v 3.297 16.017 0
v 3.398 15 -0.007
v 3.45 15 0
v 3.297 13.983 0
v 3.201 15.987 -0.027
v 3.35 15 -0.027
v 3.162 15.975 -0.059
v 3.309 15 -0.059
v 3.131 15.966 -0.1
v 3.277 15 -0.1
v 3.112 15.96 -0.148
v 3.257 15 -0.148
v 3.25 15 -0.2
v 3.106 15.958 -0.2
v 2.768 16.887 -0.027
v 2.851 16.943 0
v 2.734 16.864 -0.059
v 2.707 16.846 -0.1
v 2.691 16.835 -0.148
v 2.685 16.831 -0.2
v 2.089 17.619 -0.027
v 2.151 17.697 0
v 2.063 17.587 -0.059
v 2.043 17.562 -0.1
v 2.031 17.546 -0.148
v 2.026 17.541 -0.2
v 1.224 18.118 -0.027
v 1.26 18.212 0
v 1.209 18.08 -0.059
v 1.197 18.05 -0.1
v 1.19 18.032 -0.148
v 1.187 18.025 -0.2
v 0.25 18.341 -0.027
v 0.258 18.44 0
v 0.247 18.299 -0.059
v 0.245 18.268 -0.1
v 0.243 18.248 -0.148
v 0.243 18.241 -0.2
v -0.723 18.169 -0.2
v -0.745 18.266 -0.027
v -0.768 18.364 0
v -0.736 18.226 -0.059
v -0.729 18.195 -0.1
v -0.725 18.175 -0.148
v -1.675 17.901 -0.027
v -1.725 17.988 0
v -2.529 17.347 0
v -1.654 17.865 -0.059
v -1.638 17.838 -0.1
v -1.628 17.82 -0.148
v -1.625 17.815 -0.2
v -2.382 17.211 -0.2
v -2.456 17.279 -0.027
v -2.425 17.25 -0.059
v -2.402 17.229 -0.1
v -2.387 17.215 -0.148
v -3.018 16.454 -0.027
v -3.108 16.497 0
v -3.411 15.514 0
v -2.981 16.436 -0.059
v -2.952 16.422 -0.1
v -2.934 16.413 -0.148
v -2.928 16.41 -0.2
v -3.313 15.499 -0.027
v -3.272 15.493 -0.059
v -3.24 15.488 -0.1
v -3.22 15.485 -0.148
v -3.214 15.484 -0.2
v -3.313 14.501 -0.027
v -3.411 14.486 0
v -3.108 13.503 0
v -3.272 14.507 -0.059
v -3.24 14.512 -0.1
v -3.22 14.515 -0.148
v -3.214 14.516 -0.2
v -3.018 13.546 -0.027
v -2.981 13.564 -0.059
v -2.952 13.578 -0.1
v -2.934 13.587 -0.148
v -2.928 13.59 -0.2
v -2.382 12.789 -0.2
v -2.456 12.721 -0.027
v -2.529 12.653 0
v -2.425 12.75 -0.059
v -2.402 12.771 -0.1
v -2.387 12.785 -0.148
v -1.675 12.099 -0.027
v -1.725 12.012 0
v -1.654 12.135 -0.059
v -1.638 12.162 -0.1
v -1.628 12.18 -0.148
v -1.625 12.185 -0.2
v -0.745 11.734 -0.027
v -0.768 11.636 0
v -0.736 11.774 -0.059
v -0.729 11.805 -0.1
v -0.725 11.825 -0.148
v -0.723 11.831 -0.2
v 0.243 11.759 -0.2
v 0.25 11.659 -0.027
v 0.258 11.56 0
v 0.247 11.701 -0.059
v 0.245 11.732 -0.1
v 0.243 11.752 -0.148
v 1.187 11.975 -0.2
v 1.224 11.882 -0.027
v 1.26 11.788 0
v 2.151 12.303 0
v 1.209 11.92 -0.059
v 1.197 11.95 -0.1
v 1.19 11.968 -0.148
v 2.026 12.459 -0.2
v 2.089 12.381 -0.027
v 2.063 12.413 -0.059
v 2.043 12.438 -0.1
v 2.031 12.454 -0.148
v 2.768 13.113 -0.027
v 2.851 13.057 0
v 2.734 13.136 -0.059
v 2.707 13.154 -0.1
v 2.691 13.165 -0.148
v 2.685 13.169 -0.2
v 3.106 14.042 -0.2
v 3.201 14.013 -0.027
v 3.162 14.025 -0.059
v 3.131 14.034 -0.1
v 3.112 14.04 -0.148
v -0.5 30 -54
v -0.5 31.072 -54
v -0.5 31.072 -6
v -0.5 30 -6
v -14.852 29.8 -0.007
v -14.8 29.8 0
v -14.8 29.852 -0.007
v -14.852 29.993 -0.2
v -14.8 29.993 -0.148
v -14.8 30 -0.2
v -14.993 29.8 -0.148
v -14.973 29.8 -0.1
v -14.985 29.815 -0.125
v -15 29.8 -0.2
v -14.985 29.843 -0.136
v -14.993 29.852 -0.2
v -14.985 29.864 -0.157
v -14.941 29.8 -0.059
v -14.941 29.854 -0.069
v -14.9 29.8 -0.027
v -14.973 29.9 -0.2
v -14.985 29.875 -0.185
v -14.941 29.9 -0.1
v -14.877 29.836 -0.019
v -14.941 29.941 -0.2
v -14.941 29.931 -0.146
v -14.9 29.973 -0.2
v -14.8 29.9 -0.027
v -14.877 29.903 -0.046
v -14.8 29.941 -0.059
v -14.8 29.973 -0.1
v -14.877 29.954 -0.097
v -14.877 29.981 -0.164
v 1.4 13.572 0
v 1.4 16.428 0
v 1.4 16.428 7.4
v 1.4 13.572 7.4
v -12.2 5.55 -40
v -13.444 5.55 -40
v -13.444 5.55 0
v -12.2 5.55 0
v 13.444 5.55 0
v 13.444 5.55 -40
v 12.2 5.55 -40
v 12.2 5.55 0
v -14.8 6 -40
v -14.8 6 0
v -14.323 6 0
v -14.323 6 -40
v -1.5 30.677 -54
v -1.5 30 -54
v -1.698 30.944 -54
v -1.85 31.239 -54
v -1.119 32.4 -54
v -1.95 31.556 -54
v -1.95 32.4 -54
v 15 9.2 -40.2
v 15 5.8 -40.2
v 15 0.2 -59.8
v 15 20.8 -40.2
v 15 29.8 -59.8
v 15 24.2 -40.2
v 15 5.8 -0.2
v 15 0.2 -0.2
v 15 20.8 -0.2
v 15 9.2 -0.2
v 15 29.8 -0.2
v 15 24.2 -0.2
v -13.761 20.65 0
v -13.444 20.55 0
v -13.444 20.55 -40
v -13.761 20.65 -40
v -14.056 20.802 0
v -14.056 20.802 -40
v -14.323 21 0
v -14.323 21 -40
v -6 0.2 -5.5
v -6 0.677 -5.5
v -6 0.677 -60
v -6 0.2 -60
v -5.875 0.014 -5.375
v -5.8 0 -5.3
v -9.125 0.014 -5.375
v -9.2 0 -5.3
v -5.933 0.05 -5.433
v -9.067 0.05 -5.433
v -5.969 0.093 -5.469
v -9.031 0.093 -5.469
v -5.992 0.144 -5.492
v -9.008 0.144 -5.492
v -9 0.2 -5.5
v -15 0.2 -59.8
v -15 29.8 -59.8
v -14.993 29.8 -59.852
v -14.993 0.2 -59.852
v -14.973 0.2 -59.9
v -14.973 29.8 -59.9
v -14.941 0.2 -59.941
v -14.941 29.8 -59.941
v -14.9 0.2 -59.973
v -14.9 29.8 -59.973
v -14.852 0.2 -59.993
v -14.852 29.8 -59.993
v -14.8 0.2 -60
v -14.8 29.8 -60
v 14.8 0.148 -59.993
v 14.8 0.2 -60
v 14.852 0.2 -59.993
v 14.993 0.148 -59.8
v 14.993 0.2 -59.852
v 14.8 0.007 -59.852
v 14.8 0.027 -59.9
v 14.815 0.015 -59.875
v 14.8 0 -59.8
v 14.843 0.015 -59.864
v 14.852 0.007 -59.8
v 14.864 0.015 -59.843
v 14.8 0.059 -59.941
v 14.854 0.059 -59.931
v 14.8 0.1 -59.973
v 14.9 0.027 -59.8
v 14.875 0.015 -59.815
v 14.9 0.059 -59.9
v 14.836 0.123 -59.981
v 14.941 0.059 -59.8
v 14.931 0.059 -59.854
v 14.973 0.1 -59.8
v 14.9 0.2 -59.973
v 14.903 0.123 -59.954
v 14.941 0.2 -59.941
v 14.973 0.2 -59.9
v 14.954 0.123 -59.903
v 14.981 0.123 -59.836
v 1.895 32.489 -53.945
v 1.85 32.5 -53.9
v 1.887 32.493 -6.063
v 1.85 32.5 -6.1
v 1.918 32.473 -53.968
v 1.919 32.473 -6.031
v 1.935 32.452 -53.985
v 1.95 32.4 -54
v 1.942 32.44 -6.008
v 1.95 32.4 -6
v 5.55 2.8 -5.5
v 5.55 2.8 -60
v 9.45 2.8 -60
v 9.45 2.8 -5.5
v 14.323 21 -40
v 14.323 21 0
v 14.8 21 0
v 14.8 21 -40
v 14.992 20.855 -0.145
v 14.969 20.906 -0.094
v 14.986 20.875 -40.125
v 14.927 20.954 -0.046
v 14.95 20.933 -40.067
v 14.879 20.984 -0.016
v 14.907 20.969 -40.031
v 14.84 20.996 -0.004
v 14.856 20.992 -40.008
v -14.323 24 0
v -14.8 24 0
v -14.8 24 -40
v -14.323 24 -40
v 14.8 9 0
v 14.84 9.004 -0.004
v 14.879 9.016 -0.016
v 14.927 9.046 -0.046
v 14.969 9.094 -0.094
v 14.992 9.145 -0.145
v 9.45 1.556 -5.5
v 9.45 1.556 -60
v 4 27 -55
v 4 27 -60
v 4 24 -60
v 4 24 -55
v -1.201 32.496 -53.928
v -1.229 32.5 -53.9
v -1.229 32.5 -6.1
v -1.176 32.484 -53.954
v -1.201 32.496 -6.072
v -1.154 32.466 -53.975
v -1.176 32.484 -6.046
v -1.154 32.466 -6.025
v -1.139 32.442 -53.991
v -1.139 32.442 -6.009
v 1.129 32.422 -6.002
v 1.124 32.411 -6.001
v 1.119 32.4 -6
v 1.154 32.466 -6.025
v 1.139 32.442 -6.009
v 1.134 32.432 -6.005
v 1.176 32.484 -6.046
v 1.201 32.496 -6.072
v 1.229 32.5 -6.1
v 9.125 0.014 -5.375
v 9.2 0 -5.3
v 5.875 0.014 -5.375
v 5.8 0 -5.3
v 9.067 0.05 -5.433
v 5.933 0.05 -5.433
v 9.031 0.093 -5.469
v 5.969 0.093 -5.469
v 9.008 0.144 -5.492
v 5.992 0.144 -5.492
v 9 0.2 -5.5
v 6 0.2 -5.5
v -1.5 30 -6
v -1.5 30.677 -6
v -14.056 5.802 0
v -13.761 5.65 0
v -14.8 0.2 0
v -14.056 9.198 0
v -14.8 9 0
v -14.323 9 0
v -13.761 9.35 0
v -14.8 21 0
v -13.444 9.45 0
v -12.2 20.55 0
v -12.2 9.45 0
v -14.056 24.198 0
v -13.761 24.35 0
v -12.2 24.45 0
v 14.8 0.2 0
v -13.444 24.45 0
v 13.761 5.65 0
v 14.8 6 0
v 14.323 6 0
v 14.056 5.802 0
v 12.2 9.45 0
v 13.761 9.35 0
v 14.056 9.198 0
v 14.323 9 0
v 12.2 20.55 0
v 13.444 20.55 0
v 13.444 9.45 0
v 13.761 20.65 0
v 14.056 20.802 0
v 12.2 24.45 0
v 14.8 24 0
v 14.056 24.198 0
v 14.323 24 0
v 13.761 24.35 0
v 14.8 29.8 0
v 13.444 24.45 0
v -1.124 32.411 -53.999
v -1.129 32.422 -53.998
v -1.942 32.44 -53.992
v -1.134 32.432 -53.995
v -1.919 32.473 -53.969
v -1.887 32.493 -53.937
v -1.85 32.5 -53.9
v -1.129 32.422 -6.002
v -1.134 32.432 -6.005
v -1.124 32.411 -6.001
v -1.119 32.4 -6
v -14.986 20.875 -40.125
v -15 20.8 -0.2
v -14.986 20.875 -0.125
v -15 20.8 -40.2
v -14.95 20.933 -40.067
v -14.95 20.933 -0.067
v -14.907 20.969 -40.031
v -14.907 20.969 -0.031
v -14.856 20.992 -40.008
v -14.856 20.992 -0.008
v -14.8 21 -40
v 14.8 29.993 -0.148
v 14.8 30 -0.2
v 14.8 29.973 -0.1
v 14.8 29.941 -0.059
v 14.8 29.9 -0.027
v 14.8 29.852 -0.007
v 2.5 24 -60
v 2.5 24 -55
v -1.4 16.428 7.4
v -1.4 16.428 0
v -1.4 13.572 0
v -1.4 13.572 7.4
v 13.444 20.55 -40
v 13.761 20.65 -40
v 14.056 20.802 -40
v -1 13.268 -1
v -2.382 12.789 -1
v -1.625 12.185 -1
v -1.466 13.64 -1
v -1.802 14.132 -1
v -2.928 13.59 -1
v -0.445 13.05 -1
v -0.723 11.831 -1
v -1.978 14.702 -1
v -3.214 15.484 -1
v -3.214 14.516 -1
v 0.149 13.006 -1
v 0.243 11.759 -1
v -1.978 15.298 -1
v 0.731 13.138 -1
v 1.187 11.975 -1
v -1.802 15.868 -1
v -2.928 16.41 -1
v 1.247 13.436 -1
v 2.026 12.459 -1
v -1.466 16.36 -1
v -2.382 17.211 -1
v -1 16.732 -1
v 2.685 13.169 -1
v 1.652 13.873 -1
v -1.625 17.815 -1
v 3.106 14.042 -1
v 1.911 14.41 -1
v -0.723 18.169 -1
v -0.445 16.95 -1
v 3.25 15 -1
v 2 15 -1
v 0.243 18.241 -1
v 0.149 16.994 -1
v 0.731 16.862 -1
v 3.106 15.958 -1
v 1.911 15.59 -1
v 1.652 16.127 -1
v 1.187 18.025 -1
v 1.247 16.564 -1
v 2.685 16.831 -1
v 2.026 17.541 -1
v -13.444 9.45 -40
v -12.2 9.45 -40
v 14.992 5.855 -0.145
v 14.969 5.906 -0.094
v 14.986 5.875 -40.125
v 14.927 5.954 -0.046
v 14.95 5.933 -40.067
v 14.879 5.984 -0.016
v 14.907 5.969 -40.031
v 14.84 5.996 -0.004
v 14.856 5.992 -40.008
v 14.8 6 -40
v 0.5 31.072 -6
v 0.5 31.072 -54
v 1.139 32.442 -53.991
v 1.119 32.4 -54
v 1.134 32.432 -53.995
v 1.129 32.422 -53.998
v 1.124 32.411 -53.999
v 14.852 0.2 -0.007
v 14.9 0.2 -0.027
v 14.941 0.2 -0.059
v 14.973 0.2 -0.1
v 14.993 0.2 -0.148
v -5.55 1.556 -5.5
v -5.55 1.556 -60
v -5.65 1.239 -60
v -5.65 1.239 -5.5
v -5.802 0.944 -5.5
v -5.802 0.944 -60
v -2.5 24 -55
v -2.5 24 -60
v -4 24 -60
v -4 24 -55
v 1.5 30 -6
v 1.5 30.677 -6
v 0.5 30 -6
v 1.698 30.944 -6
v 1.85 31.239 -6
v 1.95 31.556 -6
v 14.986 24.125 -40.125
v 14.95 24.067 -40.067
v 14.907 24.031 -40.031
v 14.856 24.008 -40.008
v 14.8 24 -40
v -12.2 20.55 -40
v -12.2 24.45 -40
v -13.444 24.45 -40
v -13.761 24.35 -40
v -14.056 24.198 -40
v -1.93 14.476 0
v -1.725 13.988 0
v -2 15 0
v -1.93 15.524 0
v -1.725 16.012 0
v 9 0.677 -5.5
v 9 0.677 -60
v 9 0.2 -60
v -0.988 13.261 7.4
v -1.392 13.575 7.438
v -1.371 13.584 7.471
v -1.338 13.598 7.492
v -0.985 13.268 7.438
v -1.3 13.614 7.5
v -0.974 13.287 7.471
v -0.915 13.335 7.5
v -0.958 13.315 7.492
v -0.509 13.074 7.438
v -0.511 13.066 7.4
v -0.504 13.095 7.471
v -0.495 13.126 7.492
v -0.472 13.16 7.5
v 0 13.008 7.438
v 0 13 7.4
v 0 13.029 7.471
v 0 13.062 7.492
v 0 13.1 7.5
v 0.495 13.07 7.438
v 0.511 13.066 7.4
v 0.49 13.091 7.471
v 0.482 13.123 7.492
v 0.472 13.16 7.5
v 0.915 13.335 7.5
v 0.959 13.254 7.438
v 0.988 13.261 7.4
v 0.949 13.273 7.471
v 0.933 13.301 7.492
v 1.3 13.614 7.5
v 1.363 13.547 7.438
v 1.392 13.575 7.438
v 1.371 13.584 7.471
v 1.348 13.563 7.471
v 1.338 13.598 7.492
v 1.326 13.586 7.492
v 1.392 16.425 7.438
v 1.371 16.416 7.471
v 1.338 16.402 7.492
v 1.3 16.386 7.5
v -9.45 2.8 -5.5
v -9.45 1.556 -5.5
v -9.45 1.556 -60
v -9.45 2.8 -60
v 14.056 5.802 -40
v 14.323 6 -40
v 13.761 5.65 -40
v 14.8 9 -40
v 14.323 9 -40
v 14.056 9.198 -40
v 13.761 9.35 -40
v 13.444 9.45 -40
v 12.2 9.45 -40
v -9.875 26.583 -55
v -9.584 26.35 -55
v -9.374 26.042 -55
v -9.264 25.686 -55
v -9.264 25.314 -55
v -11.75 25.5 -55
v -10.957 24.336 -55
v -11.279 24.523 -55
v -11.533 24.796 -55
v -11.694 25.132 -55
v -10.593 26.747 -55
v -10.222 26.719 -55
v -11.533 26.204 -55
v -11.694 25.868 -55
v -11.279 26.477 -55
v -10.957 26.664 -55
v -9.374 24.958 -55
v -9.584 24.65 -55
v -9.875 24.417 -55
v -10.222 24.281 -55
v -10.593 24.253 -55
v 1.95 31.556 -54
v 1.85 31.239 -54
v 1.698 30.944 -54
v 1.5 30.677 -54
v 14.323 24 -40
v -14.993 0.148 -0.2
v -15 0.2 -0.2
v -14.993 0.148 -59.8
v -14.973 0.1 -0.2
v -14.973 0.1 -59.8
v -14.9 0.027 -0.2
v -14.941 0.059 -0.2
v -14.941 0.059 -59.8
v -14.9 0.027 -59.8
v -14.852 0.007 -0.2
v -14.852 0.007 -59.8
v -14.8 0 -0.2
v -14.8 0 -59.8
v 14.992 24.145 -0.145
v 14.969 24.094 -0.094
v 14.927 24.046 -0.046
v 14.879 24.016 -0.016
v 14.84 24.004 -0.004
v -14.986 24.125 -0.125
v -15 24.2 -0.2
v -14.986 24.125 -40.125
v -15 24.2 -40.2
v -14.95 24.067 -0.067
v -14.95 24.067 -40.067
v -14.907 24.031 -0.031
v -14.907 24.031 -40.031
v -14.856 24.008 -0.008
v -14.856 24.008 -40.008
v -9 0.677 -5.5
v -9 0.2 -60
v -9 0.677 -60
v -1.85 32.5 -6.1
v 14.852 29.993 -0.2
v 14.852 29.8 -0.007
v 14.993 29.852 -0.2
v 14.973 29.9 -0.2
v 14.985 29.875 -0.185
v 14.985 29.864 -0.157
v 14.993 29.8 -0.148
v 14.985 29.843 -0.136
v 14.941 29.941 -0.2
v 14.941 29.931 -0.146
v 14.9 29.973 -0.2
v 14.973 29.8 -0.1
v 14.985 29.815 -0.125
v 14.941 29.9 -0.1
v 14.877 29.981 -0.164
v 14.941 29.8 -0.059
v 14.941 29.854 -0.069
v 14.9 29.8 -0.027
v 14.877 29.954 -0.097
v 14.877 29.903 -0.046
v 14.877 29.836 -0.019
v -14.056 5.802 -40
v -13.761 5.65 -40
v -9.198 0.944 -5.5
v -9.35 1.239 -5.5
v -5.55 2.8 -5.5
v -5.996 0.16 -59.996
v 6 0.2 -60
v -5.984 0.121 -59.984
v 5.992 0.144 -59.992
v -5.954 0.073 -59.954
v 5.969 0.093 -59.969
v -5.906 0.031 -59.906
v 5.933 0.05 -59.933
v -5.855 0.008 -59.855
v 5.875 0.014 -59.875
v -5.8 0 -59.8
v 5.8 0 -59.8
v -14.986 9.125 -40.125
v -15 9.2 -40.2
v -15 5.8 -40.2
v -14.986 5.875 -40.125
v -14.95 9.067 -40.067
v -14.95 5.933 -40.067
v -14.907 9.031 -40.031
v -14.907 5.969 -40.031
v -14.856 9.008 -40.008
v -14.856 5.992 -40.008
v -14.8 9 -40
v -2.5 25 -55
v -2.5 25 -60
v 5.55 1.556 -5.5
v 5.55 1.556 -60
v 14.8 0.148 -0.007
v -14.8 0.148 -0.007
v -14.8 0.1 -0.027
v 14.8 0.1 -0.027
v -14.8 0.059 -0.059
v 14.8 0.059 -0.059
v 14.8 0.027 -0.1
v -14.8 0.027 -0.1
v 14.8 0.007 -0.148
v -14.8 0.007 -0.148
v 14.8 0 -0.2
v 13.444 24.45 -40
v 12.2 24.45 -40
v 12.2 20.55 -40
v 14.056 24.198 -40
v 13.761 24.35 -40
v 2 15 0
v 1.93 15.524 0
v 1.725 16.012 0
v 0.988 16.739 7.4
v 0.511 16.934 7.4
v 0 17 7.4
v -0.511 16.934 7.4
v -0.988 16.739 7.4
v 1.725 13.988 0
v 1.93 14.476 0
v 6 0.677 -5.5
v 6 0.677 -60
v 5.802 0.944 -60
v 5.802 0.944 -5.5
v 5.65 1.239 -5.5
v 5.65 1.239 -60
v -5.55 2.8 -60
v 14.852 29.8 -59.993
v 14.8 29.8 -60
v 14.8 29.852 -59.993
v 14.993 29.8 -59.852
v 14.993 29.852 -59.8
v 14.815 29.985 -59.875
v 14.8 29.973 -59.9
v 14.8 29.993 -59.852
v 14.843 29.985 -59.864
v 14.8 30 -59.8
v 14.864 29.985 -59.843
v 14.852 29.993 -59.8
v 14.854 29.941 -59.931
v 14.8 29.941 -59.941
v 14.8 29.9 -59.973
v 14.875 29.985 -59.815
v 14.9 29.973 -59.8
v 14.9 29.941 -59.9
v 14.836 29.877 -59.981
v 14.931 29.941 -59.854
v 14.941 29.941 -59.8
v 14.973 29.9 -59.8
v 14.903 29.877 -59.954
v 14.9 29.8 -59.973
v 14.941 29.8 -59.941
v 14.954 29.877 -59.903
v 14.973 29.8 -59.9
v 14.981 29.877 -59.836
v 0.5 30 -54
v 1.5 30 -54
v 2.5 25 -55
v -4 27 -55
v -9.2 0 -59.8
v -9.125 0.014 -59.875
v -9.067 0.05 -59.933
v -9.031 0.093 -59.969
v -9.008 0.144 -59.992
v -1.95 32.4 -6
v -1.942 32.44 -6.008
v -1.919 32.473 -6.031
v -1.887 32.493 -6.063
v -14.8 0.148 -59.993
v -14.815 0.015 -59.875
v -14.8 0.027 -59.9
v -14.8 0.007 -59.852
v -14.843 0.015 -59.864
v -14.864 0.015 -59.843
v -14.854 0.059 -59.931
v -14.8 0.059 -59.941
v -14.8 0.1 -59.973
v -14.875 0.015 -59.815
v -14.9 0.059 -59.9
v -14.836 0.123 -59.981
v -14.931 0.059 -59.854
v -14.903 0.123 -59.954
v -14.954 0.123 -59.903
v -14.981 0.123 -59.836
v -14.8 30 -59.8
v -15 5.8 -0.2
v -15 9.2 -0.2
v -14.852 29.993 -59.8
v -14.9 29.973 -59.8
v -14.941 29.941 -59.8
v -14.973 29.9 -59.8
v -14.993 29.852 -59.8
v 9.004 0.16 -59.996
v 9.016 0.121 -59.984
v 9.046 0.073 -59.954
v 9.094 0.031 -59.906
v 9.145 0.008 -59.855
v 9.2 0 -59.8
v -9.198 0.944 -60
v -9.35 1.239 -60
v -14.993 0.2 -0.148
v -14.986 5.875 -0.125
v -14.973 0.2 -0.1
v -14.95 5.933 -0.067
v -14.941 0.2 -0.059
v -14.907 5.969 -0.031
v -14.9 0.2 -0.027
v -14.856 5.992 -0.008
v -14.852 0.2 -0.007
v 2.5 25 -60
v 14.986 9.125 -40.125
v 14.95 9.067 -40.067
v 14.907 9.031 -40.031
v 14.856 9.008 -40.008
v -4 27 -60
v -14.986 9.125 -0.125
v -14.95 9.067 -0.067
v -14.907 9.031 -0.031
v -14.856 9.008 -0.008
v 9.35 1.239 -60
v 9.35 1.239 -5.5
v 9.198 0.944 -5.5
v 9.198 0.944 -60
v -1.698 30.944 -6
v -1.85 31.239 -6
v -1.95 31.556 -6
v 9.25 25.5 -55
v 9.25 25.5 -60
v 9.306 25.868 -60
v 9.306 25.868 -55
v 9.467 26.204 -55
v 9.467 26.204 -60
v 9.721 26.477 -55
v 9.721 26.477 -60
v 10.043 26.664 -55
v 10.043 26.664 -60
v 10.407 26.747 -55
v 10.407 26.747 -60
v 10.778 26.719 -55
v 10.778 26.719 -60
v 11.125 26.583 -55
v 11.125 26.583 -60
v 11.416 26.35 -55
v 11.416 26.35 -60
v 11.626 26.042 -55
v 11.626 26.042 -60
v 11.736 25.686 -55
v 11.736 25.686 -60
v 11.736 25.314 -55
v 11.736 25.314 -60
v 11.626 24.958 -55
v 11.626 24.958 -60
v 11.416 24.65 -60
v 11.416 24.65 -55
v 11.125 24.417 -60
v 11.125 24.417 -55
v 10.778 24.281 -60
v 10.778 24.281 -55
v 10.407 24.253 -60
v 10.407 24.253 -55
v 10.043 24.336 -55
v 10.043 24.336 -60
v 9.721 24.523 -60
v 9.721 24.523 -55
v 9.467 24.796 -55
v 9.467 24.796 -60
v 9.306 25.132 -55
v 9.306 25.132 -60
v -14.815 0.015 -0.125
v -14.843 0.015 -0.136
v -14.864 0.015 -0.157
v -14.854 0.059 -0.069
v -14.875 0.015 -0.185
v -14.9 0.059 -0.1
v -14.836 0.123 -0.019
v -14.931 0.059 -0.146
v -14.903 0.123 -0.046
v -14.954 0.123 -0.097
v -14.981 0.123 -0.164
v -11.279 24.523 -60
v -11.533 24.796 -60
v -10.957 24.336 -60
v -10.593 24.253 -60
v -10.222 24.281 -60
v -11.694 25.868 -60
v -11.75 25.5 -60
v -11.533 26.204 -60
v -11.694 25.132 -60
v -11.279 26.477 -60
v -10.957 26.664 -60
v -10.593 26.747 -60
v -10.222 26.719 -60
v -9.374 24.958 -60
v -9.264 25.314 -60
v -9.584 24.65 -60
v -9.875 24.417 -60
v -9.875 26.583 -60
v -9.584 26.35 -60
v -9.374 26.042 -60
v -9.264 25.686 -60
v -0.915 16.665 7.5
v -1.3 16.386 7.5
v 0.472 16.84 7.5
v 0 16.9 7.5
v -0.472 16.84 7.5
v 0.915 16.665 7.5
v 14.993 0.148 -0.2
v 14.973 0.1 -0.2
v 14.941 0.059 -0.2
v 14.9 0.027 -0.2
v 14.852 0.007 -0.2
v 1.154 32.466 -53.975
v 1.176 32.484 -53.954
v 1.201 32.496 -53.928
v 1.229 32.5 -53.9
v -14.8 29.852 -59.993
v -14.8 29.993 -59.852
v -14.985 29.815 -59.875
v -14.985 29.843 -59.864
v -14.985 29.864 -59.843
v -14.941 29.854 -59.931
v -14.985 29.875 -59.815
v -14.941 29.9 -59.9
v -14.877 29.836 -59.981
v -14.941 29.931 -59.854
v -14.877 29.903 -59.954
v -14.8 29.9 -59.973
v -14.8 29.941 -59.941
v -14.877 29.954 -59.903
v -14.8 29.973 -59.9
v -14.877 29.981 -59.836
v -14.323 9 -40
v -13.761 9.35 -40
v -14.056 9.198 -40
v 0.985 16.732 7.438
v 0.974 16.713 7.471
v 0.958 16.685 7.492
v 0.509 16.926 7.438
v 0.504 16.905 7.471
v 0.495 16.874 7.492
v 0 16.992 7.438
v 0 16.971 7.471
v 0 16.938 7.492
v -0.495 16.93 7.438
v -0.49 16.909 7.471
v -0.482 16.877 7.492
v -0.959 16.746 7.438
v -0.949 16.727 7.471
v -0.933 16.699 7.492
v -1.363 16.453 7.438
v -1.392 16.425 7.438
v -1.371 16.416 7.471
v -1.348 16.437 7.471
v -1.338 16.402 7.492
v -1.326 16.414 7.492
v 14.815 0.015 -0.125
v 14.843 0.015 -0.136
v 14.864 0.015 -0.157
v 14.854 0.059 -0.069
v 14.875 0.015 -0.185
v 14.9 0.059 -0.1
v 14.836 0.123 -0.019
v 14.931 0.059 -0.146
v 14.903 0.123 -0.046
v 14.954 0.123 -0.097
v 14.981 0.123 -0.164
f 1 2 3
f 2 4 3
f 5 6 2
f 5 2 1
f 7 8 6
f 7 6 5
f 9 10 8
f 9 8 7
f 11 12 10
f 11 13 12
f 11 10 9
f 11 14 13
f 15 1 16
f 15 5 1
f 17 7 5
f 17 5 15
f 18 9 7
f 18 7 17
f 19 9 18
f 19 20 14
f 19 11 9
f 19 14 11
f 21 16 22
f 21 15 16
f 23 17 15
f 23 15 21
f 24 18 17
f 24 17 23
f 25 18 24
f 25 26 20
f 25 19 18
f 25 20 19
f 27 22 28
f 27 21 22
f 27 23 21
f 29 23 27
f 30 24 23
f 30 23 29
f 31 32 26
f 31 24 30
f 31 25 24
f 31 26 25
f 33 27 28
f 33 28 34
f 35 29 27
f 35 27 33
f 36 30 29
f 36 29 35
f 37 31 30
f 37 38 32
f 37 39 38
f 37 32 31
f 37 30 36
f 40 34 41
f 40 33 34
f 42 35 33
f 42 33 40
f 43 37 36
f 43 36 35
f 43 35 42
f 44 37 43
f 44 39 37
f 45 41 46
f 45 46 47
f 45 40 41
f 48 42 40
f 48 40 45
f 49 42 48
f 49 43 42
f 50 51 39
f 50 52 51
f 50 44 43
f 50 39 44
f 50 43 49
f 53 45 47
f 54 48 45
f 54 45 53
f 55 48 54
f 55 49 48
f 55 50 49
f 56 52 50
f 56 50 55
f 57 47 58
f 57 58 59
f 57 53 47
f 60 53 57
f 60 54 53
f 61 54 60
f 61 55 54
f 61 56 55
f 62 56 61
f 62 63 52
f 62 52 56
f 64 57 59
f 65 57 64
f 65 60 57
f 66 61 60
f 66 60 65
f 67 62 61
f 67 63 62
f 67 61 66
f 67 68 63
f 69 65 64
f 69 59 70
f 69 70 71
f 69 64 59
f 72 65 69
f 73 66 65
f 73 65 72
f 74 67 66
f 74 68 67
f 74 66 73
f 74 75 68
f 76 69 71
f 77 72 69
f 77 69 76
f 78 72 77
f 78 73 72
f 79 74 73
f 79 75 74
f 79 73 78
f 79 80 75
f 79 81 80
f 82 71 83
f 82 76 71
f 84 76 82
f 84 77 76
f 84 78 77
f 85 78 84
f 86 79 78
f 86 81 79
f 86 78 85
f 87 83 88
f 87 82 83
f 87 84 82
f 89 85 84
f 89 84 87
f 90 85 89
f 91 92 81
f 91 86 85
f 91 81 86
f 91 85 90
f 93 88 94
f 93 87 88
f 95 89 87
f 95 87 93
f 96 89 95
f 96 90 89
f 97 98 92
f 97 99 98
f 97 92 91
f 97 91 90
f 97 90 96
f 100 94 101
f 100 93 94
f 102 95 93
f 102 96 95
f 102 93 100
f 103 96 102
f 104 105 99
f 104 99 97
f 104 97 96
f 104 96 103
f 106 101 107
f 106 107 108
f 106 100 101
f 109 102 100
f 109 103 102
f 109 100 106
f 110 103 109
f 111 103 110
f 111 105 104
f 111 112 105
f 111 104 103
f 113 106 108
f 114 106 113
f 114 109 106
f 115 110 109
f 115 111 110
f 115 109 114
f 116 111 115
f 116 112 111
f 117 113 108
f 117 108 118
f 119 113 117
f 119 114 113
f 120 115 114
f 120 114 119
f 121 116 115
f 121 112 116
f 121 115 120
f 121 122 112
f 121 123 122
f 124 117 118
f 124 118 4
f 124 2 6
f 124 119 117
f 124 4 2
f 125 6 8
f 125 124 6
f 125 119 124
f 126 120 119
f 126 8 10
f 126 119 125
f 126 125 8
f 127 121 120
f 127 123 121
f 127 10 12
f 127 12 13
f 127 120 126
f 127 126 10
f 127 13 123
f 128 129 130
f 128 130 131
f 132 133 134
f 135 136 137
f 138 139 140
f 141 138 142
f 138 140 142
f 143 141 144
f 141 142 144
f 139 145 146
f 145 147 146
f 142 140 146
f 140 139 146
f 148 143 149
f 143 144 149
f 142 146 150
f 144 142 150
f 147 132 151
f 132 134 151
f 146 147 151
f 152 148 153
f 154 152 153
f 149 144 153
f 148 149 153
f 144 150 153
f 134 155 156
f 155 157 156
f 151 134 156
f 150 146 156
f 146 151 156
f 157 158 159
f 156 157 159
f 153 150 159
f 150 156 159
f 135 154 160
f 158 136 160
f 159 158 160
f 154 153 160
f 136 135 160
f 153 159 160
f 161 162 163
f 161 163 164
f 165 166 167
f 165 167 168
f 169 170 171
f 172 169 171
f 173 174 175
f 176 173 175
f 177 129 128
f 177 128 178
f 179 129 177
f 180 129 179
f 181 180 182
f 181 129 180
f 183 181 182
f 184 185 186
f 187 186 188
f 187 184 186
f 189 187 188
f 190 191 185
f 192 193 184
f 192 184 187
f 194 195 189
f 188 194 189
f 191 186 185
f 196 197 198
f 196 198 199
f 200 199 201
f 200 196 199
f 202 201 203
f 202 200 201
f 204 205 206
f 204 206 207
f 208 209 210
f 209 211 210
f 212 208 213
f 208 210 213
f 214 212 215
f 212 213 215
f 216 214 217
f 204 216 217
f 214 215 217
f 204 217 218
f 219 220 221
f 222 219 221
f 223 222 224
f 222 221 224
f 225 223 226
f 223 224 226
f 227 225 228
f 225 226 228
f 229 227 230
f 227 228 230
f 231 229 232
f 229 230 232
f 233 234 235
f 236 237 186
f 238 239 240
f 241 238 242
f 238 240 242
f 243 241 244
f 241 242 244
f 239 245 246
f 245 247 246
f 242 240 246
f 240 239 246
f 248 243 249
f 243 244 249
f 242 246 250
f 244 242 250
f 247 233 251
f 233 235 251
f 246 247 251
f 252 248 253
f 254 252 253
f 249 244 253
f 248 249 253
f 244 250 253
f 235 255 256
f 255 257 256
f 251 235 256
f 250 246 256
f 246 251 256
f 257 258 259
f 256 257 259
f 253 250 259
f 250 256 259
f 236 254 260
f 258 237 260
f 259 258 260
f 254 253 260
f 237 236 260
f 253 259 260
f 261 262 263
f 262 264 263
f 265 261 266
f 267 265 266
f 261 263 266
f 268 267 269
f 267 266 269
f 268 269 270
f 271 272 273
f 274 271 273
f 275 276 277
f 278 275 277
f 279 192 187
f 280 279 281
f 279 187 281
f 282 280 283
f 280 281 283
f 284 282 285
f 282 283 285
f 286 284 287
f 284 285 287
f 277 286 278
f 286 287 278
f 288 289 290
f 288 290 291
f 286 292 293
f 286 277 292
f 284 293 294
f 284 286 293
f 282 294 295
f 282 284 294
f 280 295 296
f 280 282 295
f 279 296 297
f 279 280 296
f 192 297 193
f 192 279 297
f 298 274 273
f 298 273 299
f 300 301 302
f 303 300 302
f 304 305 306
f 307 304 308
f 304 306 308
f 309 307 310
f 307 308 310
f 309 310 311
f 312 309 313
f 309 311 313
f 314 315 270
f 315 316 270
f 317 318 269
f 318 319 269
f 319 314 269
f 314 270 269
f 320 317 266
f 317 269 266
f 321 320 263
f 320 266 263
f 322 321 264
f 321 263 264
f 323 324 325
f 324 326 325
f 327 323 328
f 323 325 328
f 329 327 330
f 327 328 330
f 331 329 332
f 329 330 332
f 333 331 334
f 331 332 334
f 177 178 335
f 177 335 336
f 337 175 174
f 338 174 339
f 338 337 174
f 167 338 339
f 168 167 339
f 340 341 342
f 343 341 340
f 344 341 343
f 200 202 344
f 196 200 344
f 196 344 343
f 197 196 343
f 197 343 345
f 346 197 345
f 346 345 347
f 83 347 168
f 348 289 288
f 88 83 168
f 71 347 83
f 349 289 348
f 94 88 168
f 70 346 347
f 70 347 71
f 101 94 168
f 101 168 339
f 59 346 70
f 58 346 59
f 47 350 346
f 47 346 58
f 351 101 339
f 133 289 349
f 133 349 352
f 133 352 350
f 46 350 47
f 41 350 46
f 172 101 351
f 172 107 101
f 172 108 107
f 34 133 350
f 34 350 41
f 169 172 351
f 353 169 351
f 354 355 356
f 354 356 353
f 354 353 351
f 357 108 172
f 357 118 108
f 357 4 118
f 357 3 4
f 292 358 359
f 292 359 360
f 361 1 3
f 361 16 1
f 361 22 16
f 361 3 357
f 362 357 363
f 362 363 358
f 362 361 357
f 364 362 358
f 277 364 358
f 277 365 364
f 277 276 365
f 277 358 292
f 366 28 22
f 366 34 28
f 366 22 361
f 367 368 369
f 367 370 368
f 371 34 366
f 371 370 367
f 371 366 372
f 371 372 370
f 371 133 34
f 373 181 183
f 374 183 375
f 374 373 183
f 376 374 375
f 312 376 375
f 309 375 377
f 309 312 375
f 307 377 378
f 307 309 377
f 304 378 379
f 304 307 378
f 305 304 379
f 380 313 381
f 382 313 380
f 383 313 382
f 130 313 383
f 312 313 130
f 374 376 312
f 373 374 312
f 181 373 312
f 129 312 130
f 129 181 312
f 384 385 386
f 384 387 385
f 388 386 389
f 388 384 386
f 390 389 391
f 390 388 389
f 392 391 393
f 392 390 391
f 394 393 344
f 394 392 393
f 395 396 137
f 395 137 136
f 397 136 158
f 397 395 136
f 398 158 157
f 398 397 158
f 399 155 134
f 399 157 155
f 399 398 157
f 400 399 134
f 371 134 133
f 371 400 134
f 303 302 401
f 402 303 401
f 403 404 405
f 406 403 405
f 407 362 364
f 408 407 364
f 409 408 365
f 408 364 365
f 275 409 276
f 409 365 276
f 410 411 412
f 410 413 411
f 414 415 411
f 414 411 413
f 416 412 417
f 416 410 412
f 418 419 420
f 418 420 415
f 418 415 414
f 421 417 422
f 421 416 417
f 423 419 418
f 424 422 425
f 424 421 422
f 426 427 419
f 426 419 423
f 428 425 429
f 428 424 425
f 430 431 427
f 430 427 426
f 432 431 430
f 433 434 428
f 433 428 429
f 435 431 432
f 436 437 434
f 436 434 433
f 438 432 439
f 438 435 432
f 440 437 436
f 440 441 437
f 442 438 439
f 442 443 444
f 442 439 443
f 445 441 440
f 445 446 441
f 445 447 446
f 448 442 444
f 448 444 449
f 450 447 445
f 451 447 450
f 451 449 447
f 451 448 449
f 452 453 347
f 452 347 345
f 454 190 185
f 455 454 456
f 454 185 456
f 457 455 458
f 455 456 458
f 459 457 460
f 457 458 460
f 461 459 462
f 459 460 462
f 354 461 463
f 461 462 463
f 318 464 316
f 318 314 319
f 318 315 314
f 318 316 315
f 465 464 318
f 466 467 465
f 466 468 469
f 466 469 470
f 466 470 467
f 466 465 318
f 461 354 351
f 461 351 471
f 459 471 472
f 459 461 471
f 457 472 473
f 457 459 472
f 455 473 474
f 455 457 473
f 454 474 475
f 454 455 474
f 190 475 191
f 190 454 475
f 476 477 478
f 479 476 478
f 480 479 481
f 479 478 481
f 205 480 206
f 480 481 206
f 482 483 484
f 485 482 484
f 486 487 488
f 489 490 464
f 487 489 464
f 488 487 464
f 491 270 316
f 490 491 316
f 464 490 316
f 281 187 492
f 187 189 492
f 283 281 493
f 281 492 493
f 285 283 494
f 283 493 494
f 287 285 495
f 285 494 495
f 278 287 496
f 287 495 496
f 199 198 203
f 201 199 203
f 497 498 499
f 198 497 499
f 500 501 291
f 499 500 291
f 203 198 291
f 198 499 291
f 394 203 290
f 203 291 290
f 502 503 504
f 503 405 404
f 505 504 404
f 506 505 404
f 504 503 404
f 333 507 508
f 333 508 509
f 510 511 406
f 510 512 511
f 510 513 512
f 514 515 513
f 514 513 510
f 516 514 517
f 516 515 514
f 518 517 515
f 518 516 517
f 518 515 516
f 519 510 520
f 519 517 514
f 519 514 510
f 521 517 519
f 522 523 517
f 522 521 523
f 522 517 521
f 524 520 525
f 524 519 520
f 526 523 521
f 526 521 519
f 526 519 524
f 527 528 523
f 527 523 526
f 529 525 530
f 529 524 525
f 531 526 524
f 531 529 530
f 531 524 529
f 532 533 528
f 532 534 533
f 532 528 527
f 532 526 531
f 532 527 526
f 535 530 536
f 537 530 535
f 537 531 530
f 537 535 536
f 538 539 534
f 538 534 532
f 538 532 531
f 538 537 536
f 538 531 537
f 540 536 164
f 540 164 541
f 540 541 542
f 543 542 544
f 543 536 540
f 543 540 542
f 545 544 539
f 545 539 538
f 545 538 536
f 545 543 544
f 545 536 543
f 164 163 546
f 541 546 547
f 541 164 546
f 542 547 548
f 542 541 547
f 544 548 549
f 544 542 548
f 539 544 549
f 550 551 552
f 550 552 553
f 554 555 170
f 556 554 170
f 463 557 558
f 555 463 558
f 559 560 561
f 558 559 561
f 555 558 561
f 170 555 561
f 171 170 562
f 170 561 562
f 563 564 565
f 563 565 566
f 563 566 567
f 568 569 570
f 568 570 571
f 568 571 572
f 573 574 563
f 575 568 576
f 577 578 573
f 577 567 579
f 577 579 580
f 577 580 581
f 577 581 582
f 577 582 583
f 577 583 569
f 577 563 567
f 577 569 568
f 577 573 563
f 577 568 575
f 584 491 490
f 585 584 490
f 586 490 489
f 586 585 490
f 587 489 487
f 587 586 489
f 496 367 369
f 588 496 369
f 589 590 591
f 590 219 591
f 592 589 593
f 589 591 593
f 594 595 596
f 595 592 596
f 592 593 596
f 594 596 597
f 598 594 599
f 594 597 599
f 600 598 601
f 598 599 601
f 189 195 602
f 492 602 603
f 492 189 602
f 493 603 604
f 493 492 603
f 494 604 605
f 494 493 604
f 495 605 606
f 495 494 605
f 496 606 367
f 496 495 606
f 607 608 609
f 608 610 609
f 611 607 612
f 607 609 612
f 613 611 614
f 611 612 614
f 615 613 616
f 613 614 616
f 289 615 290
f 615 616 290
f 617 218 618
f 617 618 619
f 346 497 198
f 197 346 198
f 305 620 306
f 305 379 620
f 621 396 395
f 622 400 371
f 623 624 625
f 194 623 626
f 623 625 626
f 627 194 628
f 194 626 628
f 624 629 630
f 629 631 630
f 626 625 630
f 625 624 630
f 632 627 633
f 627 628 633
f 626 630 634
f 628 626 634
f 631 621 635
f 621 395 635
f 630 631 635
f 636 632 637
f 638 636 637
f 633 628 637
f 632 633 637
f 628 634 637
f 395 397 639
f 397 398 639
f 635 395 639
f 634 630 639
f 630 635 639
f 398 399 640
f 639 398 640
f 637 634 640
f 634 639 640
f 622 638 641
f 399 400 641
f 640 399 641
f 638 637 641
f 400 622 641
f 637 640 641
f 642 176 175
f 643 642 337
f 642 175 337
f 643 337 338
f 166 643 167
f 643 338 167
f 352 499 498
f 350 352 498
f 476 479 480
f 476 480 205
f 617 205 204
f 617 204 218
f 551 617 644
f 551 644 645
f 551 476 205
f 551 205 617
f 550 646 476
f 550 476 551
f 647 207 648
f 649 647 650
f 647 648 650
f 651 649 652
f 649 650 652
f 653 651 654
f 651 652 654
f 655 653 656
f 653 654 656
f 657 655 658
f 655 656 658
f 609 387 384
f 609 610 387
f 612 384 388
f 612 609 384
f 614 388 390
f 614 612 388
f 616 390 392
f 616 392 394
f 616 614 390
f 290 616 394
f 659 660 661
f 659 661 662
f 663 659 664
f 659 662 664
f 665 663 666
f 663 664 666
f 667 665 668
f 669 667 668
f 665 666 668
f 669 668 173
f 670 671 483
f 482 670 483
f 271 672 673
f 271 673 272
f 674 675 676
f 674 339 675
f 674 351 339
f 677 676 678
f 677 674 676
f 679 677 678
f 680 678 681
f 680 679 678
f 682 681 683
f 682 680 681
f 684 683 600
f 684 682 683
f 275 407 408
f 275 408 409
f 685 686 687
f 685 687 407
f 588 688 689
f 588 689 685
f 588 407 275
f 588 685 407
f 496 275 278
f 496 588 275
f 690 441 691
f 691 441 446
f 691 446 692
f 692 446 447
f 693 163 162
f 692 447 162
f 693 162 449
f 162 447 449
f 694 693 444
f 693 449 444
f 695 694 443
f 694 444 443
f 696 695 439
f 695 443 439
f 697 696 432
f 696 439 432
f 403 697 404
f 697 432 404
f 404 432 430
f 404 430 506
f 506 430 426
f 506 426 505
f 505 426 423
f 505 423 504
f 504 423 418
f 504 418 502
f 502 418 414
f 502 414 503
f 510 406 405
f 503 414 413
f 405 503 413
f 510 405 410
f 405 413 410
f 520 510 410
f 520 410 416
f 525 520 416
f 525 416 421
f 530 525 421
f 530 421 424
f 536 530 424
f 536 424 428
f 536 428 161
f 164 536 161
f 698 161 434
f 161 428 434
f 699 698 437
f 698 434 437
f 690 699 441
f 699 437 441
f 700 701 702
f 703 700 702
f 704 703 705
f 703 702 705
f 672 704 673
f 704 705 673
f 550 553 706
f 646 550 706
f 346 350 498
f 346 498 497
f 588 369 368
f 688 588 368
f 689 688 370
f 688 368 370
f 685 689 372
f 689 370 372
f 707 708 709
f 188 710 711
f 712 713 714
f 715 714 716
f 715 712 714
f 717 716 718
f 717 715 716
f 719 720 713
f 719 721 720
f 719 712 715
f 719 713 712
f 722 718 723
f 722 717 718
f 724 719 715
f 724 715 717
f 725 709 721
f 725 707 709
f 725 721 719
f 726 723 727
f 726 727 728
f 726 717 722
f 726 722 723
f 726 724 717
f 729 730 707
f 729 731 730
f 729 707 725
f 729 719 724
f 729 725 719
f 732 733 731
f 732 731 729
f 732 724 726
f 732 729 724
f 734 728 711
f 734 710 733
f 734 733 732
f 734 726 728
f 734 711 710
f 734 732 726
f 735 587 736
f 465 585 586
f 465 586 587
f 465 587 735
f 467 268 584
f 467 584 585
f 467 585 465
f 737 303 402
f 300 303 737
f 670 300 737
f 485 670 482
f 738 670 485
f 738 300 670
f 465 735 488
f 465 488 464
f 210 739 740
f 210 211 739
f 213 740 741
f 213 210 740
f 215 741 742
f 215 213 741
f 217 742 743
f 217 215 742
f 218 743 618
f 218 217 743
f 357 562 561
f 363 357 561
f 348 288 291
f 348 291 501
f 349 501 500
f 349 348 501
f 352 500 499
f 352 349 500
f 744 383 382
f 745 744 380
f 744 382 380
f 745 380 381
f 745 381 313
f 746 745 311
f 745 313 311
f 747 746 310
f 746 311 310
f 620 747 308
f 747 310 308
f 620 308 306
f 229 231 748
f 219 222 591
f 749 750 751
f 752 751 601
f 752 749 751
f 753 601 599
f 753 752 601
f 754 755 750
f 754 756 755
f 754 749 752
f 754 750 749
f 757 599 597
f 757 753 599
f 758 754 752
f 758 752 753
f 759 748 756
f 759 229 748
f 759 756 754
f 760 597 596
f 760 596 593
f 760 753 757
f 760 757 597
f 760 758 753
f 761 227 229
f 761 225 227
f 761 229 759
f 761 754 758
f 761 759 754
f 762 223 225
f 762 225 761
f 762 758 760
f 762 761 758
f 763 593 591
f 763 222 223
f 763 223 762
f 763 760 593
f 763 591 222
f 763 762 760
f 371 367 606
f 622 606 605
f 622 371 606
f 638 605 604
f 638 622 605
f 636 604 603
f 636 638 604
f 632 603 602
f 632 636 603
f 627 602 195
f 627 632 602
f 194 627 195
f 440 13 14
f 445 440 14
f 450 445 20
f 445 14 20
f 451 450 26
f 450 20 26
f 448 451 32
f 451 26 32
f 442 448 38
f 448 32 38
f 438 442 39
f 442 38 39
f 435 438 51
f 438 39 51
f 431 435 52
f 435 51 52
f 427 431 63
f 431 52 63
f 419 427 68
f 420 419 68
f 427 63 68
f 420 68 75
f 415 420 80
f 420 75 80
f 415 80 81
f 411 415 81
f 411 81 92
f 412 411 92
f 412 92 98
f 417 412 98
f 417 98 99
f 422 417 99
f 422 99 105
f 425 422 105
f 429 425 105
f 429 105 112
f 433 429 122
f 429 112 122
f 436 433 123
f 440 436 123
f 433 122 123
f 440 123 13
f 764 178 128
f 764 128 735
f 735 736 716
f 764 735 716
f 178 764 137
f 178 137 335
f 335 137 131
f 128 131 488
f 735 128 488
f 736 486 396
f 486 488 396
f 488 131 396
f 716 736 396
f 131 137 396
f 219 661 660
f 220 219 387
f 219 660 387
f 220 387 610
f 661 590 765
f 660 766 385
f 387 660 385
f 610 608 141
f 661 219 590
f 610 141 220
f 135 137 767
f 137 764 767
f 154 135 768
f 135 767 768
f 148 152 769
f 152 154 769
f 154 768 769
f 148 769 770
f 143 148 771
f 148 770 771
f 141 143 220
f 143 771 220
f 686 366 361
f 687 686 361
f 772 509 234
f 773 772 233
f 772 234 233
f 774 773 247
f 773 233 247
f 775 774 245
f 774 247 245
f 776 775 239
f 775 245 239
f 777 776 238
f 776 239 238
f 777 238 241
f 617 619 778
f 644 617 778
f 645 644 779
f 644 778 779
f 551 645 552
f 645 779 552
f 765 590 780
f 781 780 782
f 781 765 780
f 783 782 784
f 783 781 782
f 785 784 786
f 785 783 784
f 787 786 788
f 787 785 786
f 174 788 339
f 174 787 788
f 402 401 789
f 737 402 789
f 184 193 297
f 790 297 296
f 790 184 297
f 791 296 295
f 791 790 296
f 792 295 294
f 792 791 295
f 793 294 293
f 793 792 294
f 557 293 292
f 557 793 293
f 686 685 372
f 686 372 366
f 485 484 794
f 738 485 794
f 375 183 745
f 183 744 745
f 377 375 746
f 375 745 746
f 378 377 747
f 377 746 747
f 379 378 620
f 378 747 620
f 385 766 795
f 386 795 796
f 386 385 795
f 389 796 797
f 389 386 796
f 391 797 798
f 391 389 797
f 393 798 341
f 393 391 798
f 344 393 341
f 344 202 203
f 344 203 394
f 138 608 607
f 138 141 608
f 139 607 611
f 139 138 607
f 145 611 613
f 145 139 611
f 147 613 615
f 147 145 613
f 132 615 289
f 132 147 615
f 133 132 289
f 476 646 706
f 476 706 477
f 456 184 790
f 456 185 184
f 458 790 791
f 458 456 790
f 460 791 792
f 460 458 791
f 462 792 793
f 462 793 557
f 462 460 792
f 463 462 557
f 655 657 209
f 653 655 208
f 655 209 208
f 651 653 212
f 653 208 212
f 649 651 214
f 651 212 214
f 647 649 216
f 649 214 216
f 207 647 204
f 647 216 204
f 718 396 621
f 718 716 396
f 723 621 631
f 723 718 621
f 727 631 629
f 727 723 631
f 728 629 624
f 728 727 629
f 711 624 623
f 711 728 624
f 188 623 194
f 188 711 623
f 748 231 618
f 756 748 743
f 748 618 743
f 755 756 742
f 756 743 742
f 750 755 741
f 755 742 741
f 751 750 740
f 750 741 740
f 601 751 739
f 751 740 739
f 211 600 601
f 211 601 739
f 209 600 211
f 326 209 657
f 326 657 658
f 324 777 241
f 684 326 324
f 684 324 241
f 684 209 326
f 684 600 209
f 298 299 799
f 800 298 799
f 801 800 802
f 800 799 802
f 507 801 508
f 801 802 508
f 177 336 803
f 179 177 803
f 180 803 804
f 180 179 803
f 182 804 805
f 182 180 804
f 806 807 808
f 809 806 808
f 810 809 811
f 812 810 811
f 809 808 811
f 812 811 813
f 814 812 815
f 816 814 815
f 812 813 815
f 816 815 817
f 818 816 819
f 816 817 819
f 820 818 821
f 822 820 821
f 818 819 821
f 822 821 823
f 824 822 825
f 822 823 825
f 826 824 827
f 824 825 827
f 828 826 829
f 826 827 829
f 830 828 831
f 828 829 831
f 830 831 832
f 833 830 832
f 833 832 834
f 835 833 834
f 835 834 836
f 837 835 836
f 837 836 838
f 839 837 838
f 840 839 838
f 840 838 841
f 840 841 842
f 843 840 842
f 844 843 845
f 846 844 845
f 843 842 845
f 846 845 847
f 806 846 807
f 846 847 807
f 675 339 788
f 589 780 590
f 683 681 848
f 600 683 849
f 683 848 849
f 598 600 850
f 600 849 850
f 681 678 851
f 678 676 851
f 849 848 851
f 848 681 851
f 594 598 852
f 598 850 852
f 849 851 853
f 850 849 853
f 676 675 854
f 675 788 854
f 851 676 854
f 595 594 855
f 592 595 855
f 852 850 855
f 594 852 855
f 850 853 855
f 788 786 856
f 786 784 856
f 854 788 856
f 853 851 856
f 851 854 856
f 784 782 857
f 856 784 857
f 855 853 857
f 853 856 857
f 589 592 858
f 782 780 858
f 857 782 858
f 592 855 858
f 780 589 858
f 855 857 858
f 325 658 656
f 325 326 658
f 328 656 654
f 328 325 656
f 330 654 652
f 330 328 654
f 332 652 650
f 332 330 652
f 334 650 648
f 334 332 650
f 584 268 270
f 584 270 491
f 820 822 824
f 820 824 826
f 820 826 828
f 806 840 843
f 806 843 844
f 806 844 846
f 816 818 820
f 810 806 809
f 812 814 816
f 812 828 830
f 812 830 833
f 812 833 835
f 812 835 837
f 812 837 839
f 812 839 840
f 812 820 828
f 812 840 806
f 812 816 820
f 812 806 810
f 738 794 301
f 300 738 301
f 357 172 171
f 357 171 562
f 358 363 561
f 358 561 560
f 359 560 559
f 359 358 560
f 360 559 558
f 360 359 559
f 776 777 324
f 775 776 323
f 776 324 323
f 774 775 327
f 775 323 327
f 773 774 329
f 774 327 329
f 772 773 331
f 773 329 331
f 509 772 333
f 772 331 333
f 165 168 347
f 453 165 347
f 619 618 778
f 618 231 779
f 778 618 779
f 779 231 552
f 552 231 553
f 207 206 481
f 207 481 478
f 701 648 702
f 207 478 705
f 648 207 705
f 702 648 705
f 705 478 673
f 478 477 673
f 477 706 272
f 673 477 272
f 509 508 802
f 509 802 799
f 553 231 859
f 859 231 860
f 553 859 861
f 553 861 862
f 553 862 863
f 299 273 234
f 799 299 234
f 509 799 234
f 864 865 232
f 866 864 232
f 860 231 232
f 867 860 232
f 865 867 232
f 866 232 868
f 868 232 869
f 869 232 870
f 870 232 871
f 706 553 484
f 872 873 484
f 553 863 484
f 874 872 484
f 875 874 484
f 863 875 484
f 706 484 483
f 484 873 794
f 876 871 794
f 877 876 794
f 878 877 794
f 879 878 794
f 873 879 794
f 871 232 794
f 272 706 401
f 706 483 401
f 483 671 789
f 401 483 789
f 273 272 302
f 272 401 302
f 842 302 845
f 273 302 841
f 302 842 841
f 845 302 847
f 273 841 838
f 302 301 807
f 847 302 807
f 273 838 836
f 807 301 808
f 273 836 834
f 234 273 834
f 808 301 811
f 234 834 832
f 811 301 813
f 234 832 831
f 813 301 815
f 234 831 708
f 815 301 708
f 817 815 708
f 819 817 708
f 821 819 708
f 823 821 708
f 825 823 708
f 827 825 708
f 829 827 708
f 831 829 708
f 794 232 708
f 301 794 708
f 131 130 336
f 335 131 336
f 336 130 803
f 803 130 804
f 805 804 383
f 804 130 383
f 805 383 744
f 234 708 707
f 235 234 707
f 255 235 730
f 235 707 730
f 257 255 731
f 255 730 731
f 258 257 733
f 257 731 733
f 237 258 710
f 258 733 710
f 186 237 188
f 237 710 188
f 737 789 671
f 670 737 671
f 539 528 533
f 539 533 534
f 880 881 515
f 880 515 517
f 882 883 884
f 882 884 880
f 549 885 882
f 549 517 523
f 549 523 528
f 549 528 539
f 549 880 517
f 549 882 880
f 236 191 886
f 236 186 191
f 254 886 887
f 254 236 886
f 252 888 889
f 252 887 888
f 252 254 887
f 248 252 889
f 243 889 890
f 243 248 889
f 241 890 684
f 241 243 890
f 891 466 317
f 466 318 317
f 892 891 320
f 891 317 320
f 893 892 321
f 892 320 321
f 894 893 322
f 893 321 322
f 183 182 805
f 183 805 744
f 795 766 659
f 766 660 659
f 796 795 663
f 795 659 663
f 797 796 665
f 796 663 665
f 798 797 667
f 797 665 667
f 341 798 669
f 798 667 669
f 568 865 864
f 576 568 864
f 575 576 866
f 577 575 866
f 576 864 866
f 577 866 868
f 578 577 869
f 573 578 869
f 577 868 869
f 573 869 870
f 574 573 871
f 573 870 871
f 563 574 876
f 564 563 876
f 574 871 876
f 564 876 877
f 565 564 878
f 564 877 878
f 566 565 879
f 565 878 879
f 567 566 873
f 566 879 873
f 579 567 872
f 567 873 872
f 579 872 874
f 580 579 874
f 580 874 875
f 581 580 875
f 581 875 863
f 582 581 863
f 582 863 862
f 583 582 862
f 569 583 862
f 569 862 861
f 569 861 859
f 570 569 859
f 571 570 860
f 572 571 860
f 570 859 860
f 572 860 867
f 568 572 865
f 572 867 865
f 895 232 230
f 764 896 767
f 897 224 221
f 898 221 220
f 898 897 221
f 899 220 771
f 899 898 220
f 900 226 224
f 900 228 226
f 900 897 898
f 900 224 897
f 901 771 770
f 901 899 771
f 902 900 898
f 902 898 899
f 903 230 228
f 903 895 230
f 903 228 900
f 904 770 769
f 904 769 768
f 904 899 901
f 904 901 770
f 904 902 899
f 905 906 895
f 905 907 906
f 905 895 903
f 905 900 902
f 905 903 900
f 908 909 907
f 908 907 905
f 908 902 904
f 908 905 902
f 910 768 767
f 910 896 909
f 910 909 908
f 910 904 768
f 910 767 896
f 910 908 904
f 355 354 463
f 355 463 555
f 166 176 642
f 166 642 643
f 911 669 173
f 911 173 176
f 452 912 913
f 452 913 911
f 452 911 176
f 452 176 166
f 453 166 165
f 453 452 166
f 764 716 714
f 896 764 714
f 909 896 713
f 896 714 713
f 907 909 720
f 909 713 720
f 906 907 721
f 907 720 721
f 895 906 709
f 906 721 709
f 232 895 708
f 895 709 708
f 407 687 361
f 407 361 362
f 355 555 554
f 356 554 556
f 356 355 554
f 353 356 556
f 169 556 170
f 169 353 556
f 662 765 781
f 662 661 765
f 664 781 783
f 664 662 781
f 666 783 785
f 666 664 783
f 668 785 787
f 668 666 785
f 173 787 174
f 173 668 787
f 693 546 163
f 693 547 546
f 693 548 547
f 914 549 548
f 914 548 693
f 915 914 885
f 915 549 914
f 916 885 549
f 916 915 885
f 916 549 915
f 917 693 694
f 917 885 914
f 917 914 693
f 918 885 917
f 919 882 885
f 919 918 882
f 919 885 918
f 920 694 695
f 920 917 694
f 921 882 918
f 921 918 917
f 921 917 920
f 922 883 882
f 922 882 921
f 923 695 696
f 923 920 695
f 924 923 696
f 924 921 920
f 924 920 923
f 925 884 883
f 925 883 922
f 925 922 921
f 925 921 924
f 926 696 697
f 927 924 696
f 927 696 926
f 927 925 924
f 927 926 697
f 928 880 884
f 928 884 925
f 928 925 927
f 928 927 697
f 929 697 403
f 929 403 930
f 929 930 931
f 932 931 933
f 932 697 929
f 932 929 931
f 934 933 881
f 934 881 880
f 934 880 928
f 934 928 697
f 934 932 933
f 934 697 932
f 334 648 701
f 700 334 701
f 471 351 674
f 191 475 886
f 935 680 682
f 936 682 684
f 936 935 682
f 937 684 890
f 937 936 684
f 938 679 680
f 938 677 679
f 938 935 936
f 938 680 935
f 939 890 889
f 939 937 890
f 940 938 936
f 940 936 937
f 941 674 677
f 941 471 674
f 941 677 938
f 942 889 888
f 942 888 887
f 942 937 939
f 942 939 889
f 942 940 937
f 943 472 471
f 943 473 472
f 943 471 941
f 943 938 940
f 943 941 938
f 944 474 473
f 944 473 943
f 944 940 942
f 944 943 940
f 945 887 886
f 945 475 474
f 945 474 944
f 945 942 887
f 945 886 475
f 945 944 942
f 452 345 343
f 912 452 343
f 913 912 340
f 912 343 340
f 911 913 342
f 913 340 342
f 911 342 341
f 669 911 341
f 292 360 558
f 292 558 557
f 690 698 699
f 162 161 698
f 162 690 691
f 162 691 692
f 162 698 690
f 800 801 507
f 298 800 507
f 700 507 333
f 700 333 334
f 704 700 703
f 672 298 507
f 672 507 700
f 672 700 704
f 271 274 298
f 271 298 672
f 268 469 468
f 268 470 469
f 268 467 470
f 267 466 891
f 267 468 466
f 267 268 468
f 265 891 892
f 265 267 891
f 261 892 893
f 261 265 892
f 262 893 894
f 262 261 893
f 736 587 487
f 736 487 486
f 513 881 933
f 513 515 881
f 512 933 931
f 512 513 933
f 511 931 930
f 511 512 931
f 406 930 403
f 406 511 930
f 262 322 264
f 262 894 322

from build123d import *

# Parameters (mm, degrees)
SKETCH_1_W          = 30
SKETCH_1_H          = 30
EXTRUDE_1_DEPTH     = 60
CUT_EXTRUDE_1_DEPTH = 54.5
CUT_EXTRUDE_START   = -60
CUT_EXTRUDE_2_DEPTH = 40
EXTRUDE_START       = -6
EXTRUDE_2_DEPTH     = 48
FILLET_1_R          = 0.1
SKETCH_6_R          = 3.25
CUT_EXTRUDE_3_DEPTH = 1
SKETCH_7_R          = 2
EXTRUDE_3_DEPTH     = 8.5
CUT_EXTRUDE_START_2 = -7.5
CUT_EXTRUDE_5_DEPTH = 7.5
SKETCH_10_R         = 1.25
CUT_EXTRUDE_6_DEPTH = 5
CUT_EXTRUDE_7_DEPTH = 5
FILLET_2_R          = 0.2
FILLET_3_R          = 0.1


with BuildPart() as part:
    # 草图1 → 凸台-拉伸1 (new body)
    with BuildSketch(Plane.XY):
        with Locations((0, 15)):
            Rectangle(SKETCH_1_W, SKETCH_1_H)
    extrude(amount=-EXTRUDE_1_DEPTH)

    # 草图2 → 切除-拉伸1 (cut)
    with BuildSketch(Plane(origin=(0, 0, -60), x_dir=(-1, 0, 0), z_dir=(0, 0, -1))):
        with BuildLine():
            Line((-9, 0.677124344), (-9, 0))
            Line((-9, 0), (-6, 0))
            Line((-6, 0), (-6, 0.677124344))
            ThreePointArc((-6, 0.677124344), (-5.719957697, 1.088161527), (-5.55, 1.555590279))
            Line((-5.55, 1.555590279), (-5.55, 2.8))
            Line((-5.55, 2.8), (-9.45, 2.8))
            Line((-9.45, 2.8), (-9.45, 1.555590279))
            ThreePointArc((-9.45, 1.555590279), (-9.280042303, 1.088161527), (-9, 0.677124344))
        make_face()
        with BuildLine():
            Line((5.55, 2.8), (5.55, 1.555590279))
            ThreePointArc((5.55, 1.555590279), (5.719957697, 1.088161527), (6, 0.677124344))
            Line((6, 0.677124344), (6, 0))
            Line((6, 0), (9, 0))
            Line((9, 0), (9, 0.677124344))
            ThreePointArc((9, 0.677124344), (9.280042303, 1.088161527), (9.45, 1.555590279))
            Line((9.45, 1.555590279), (9.45, 2.8))
            Line((9.45, 2.8), (5.55, 2.8))
        make_face()
    extrude(amount=-CUT_EXTRUDE_1_DEPTH, mode=Mode.SUBTRACT)

    # 草图3 → 切除-拉伸2 (cut)
    with BuildSketch(Plane(origin=(0, 0, -60), x_dir=(-1, 0, 0), z_dir=(0, 0, -1)).offset(CUT_EXTRUDE_START)):
        with BuildLine():
            Line((-14.322875656, 9), (-15, 9))
            Line((-15, 9), (-15, 6))
            Line((-15, 6), (-14.322875656, 6))
            ThreePointArc((-14.322875656, 6), (-13.911838473, 5.719957697), (-13.444409721, 5.55))
            Line((-13.444409721, 5.55), (-12.2, 5.55))
            Line((-12.2, 5.55), (-12.2, 9.45))
            Line((-12.2, 9.45), (-13.444409721, 9.45))
            ThreePointArc((-13.444409721, 9.45), (-13.911838473, 9.280042303), (-14.322875656, 9))
        make_face()
        with BuildLine():
            Line((-12.2, 20.55), (-13.444409721, 20.55))
            ThreePointArc((-13.444409721, 20.55), (-13.911838473, 20.719957697), (-14.322875656, 21))
            Line((-14.322875656, 21), (-15, 21))
            Line((-15, 21), (-15, 24))
            Line((-15, 24), (-14.322875656, 24))
            ThreePointArc((-14.322875656, 24), (-13.911838473, 24.280042303), (-13.444409721, 24.45))
            Line((-13.444409721, 24.45), (-12.2, 24.45))
            Line((-12.2, 24.45), (-12.2, 20.55))
        make_face()
        with BuildLine():
            Line((14.322875656, 21), (15, 21))
            Line((15, 21), (15, 24))
            Line((15, 24), (14.322875656, 24))
            ThreePointArc((14.322875656, 24), (13.911838473, 24.280042303), (13.444409721, 24.45))
            Line((13.444409721, 24.45), (12.2, 24.45))
            Line((12.2, 24.45), (12.2, 20.55))
            Line((12.2, 20.55), (13.444409721, 20.55))
            ThreePointArc((13.444409721, 20.55), (13.911838473, 20.719957697), (14.322875656, 21))
        make_face()
        with BuildLine():
            Line((12.2, 9.45), (13.444409721, 9.45))
            ThreePointArc((13.444409721, 9.45), (13.911838473, 9.280042303), (14.322875656, 9))
            Line((14.322875656, 9), (15, 9))
            Line((15, 9), (15, 6))
            Line((15, 6), (14.322875656, 6))
            ThreePointArc((14.322875656, 6), (13.911838473, 5.719957697), (13.444409721, 5.55))
            Line((13.444409721, 5.55), (12.2, 5.55))
            Line((12.2, 5.55), (12.2, 9.45))
        make_face()
    extrude(amount=CUT_EXTRUDE_2_DEPTH, mode=Mode.SUBTRACT)

    # 草图5 → 凸台-拉伸2 (add)
    with BuildSketch(Plane(origin=(0, 0, -60), x_dir=(-1, 0, 0), z_dir=(0, 0, -1)).offset(EXTRUDE_START)):
        with BuildLine():
            Line((-1.5, 30.677124344), (-1.5, 30))
            Line((-1.5, 30), (-0.5, 30))
            Line((-0.5, 30), (-0.5, 31.07225346))
            Line((-0.5, 31.07225346), (-1.165769145, 32.5))
            Line((-1.165769145, 32.5), (-1.95, 32.5))
            Line((-1.95, 32.5), (-1.95, 31.555590279))
            ThreePointArc((-1.95, 31.555590279), (-1.780042303, 31.088161527), (-1.5, 30.677124344))
        make_face()
        with BuildLine():
            Line((1.5, 30), (1.5, 30.677124344))
            ThreePointArc((1.5, 30.677124344), (1.780042303, 31.088161527), (1.95, 31.555590279))
            Line((1.95, 31.555590279), (1.95, 32.5))
            Line((1.95, 32.5), (1.165769145, 32.5))
            Line((1.165769145, 32.5), (0.5, 31.07225346))
            Line((0.5, 31.07225346), (0.5, 30))
            Line((0.5, 30), (1.5, 30))
        make_face()
    extrude(amount=-EXTRUDE_2_DEPTH)

    # 圆角1
    fillet_1_edges = [part.edges().sort_by_distance(p)[0] for p in [
        (1.557884573, 32.5, -6),
        (1.95, 32.5, -30),
        (1.165769145, 32.5, -30),
        (1.557884573, 32.5, -54),
        (-1.557884573, 32.5, -6),
        (-1.165769145, 32.5, -30),
        (-1.95, 32.5, -30),
        (-1.557884573, 32.5, -54),
    ]]
    fillet(fillet_1_edges, radius=FILLET_1_R)

    # 草图6 → 切除-拉伸3 (cut)
    with BuildSketch(Plane.XY):
        with Locations((0, 15)):
            Circle(SKETCH_6_R)
    extrude(amount=-CUT_EXTRUDE_3_DEPTH, mode=Mode.SUBTRACT)

    # 草图7 → 凸台-拉伸3 (add)
    with BuildSketch(Plane.XY.offset(-1)):
        with Locations((0, 15)):
            Circle(SKETCH_7_R)
    extrude(amount=EXTRUDE_3_DEPTH)

    # 草图9 → 切除-拉伸5 (cut)
    with BuildSketch(Plane.XY.offset(7.5).offset(CUT_EXTRUDE_START_2)):
        with BuildLine():
            Line((-1.4, 16.428285686), (-1.4, 13.571714314))
            ThreePointArc((-1.4, 13.571714314), (-2, 15), (-1.4, 16.428285686))
        make_face()
        with BuildLine():
            Line((1.4, 16.428285686), (1.4, 13.571714314))
            ThreePointArc((1.4, 13.571714314), (2, 15), (1.4, 16.428285686))
        make_face()
    extrude(amount=CUT_EXTRUDE_5_DEPTH, mode=Mode.SUBTRACT)

    # 草图10 → 切除-拉伸6 (cut)
    with BuildSketch(Plane(origin=(0, 0, -60), x_dir=(-1, 0, 0), z_dir=(0, 0, -1))):
        with Locations((-10.5, 25.5)):
            Circle(SKETCH_10_R)
        with Locations((10.5, 25.5)):
            Circle(SKETCH_10_R)
    extrude(amount=-CUT_EXTRUDE_6_DEPTH, mode=Mode.SUBTRACT)

    # 草图11 → 切除-拉伸7 (cut)
    with BuildSketch(Plane(origin=(0, 0, -60), x_dir=(-1, 0, 0), z_dir=(0, 0, -1))):
        Polygon((2.5, 24), (4, 24), (4, 27), (-4, 27), (-4, 24), (-2.5, 24), (-2.5, 25), (2.5, 25), align=None)
    extrude(amount=-CUT_EXTRUDE_7_DEPTH, mode=Mode.SUBTRACT)

    # 圆角2
    fillet_2_edges = [part.edges().sort_by_distance(p)[0] for p in [
        (15, 15, -60),
        (-15, 15, 0),
        (-15, 21, -20),
        (-15, 24, -20),
        (-15, 22.5, -40),
        (-15, 3, 0),
        (0, 30, -60),
        (-15, 6, -20),
        (-15, 9, -20),
        (-15, 7.5, -40),
        (12, 0, -60),
        (7.5, 0, -5.5),
        (6, 0, -32.75),
        (9, 0, -32.75),
        (-3.25, 15, 0),
        (0, 0, -60),
        (-15, 15, -60),
        (-7.5, 0, -5.5),
        (-9, 0, -32.75),
        (-6, 0, -32.75),
        (0, 30, 0),
        (15, 3, 0),
        (0, 0, 0),
        (-15, 27, 0),
        (15, 15, 0),
        (15, 9, -20),
        (15, 6, -20),
        (-12, 0, -60),
        (15, 7.5, -40),
        (-15, 30, -30),
        (15, 30, -30),
        (15, 0, -30),
        (-15, 0, -30),
        (15, 27, 0),
        (15, 24, -20),
        (15, 21, -20),
        (15, 22.5, -40),
    ]]
    fillet(fillet_2_edges, radius=FILLET_2_R)

    # 圆角3
    fillet_3_edges = [part.edges().sort_by_distance(p)[0] for p in [
        (0, 17, 7.5),
        (1.4, 15, 7.5),
        (0, 13, 7.5),
        (-1.4, 15, 7.5),
    ]]
    fillet(fillet_3_edges, radius=FILLET_3_R)


solid = part.part
